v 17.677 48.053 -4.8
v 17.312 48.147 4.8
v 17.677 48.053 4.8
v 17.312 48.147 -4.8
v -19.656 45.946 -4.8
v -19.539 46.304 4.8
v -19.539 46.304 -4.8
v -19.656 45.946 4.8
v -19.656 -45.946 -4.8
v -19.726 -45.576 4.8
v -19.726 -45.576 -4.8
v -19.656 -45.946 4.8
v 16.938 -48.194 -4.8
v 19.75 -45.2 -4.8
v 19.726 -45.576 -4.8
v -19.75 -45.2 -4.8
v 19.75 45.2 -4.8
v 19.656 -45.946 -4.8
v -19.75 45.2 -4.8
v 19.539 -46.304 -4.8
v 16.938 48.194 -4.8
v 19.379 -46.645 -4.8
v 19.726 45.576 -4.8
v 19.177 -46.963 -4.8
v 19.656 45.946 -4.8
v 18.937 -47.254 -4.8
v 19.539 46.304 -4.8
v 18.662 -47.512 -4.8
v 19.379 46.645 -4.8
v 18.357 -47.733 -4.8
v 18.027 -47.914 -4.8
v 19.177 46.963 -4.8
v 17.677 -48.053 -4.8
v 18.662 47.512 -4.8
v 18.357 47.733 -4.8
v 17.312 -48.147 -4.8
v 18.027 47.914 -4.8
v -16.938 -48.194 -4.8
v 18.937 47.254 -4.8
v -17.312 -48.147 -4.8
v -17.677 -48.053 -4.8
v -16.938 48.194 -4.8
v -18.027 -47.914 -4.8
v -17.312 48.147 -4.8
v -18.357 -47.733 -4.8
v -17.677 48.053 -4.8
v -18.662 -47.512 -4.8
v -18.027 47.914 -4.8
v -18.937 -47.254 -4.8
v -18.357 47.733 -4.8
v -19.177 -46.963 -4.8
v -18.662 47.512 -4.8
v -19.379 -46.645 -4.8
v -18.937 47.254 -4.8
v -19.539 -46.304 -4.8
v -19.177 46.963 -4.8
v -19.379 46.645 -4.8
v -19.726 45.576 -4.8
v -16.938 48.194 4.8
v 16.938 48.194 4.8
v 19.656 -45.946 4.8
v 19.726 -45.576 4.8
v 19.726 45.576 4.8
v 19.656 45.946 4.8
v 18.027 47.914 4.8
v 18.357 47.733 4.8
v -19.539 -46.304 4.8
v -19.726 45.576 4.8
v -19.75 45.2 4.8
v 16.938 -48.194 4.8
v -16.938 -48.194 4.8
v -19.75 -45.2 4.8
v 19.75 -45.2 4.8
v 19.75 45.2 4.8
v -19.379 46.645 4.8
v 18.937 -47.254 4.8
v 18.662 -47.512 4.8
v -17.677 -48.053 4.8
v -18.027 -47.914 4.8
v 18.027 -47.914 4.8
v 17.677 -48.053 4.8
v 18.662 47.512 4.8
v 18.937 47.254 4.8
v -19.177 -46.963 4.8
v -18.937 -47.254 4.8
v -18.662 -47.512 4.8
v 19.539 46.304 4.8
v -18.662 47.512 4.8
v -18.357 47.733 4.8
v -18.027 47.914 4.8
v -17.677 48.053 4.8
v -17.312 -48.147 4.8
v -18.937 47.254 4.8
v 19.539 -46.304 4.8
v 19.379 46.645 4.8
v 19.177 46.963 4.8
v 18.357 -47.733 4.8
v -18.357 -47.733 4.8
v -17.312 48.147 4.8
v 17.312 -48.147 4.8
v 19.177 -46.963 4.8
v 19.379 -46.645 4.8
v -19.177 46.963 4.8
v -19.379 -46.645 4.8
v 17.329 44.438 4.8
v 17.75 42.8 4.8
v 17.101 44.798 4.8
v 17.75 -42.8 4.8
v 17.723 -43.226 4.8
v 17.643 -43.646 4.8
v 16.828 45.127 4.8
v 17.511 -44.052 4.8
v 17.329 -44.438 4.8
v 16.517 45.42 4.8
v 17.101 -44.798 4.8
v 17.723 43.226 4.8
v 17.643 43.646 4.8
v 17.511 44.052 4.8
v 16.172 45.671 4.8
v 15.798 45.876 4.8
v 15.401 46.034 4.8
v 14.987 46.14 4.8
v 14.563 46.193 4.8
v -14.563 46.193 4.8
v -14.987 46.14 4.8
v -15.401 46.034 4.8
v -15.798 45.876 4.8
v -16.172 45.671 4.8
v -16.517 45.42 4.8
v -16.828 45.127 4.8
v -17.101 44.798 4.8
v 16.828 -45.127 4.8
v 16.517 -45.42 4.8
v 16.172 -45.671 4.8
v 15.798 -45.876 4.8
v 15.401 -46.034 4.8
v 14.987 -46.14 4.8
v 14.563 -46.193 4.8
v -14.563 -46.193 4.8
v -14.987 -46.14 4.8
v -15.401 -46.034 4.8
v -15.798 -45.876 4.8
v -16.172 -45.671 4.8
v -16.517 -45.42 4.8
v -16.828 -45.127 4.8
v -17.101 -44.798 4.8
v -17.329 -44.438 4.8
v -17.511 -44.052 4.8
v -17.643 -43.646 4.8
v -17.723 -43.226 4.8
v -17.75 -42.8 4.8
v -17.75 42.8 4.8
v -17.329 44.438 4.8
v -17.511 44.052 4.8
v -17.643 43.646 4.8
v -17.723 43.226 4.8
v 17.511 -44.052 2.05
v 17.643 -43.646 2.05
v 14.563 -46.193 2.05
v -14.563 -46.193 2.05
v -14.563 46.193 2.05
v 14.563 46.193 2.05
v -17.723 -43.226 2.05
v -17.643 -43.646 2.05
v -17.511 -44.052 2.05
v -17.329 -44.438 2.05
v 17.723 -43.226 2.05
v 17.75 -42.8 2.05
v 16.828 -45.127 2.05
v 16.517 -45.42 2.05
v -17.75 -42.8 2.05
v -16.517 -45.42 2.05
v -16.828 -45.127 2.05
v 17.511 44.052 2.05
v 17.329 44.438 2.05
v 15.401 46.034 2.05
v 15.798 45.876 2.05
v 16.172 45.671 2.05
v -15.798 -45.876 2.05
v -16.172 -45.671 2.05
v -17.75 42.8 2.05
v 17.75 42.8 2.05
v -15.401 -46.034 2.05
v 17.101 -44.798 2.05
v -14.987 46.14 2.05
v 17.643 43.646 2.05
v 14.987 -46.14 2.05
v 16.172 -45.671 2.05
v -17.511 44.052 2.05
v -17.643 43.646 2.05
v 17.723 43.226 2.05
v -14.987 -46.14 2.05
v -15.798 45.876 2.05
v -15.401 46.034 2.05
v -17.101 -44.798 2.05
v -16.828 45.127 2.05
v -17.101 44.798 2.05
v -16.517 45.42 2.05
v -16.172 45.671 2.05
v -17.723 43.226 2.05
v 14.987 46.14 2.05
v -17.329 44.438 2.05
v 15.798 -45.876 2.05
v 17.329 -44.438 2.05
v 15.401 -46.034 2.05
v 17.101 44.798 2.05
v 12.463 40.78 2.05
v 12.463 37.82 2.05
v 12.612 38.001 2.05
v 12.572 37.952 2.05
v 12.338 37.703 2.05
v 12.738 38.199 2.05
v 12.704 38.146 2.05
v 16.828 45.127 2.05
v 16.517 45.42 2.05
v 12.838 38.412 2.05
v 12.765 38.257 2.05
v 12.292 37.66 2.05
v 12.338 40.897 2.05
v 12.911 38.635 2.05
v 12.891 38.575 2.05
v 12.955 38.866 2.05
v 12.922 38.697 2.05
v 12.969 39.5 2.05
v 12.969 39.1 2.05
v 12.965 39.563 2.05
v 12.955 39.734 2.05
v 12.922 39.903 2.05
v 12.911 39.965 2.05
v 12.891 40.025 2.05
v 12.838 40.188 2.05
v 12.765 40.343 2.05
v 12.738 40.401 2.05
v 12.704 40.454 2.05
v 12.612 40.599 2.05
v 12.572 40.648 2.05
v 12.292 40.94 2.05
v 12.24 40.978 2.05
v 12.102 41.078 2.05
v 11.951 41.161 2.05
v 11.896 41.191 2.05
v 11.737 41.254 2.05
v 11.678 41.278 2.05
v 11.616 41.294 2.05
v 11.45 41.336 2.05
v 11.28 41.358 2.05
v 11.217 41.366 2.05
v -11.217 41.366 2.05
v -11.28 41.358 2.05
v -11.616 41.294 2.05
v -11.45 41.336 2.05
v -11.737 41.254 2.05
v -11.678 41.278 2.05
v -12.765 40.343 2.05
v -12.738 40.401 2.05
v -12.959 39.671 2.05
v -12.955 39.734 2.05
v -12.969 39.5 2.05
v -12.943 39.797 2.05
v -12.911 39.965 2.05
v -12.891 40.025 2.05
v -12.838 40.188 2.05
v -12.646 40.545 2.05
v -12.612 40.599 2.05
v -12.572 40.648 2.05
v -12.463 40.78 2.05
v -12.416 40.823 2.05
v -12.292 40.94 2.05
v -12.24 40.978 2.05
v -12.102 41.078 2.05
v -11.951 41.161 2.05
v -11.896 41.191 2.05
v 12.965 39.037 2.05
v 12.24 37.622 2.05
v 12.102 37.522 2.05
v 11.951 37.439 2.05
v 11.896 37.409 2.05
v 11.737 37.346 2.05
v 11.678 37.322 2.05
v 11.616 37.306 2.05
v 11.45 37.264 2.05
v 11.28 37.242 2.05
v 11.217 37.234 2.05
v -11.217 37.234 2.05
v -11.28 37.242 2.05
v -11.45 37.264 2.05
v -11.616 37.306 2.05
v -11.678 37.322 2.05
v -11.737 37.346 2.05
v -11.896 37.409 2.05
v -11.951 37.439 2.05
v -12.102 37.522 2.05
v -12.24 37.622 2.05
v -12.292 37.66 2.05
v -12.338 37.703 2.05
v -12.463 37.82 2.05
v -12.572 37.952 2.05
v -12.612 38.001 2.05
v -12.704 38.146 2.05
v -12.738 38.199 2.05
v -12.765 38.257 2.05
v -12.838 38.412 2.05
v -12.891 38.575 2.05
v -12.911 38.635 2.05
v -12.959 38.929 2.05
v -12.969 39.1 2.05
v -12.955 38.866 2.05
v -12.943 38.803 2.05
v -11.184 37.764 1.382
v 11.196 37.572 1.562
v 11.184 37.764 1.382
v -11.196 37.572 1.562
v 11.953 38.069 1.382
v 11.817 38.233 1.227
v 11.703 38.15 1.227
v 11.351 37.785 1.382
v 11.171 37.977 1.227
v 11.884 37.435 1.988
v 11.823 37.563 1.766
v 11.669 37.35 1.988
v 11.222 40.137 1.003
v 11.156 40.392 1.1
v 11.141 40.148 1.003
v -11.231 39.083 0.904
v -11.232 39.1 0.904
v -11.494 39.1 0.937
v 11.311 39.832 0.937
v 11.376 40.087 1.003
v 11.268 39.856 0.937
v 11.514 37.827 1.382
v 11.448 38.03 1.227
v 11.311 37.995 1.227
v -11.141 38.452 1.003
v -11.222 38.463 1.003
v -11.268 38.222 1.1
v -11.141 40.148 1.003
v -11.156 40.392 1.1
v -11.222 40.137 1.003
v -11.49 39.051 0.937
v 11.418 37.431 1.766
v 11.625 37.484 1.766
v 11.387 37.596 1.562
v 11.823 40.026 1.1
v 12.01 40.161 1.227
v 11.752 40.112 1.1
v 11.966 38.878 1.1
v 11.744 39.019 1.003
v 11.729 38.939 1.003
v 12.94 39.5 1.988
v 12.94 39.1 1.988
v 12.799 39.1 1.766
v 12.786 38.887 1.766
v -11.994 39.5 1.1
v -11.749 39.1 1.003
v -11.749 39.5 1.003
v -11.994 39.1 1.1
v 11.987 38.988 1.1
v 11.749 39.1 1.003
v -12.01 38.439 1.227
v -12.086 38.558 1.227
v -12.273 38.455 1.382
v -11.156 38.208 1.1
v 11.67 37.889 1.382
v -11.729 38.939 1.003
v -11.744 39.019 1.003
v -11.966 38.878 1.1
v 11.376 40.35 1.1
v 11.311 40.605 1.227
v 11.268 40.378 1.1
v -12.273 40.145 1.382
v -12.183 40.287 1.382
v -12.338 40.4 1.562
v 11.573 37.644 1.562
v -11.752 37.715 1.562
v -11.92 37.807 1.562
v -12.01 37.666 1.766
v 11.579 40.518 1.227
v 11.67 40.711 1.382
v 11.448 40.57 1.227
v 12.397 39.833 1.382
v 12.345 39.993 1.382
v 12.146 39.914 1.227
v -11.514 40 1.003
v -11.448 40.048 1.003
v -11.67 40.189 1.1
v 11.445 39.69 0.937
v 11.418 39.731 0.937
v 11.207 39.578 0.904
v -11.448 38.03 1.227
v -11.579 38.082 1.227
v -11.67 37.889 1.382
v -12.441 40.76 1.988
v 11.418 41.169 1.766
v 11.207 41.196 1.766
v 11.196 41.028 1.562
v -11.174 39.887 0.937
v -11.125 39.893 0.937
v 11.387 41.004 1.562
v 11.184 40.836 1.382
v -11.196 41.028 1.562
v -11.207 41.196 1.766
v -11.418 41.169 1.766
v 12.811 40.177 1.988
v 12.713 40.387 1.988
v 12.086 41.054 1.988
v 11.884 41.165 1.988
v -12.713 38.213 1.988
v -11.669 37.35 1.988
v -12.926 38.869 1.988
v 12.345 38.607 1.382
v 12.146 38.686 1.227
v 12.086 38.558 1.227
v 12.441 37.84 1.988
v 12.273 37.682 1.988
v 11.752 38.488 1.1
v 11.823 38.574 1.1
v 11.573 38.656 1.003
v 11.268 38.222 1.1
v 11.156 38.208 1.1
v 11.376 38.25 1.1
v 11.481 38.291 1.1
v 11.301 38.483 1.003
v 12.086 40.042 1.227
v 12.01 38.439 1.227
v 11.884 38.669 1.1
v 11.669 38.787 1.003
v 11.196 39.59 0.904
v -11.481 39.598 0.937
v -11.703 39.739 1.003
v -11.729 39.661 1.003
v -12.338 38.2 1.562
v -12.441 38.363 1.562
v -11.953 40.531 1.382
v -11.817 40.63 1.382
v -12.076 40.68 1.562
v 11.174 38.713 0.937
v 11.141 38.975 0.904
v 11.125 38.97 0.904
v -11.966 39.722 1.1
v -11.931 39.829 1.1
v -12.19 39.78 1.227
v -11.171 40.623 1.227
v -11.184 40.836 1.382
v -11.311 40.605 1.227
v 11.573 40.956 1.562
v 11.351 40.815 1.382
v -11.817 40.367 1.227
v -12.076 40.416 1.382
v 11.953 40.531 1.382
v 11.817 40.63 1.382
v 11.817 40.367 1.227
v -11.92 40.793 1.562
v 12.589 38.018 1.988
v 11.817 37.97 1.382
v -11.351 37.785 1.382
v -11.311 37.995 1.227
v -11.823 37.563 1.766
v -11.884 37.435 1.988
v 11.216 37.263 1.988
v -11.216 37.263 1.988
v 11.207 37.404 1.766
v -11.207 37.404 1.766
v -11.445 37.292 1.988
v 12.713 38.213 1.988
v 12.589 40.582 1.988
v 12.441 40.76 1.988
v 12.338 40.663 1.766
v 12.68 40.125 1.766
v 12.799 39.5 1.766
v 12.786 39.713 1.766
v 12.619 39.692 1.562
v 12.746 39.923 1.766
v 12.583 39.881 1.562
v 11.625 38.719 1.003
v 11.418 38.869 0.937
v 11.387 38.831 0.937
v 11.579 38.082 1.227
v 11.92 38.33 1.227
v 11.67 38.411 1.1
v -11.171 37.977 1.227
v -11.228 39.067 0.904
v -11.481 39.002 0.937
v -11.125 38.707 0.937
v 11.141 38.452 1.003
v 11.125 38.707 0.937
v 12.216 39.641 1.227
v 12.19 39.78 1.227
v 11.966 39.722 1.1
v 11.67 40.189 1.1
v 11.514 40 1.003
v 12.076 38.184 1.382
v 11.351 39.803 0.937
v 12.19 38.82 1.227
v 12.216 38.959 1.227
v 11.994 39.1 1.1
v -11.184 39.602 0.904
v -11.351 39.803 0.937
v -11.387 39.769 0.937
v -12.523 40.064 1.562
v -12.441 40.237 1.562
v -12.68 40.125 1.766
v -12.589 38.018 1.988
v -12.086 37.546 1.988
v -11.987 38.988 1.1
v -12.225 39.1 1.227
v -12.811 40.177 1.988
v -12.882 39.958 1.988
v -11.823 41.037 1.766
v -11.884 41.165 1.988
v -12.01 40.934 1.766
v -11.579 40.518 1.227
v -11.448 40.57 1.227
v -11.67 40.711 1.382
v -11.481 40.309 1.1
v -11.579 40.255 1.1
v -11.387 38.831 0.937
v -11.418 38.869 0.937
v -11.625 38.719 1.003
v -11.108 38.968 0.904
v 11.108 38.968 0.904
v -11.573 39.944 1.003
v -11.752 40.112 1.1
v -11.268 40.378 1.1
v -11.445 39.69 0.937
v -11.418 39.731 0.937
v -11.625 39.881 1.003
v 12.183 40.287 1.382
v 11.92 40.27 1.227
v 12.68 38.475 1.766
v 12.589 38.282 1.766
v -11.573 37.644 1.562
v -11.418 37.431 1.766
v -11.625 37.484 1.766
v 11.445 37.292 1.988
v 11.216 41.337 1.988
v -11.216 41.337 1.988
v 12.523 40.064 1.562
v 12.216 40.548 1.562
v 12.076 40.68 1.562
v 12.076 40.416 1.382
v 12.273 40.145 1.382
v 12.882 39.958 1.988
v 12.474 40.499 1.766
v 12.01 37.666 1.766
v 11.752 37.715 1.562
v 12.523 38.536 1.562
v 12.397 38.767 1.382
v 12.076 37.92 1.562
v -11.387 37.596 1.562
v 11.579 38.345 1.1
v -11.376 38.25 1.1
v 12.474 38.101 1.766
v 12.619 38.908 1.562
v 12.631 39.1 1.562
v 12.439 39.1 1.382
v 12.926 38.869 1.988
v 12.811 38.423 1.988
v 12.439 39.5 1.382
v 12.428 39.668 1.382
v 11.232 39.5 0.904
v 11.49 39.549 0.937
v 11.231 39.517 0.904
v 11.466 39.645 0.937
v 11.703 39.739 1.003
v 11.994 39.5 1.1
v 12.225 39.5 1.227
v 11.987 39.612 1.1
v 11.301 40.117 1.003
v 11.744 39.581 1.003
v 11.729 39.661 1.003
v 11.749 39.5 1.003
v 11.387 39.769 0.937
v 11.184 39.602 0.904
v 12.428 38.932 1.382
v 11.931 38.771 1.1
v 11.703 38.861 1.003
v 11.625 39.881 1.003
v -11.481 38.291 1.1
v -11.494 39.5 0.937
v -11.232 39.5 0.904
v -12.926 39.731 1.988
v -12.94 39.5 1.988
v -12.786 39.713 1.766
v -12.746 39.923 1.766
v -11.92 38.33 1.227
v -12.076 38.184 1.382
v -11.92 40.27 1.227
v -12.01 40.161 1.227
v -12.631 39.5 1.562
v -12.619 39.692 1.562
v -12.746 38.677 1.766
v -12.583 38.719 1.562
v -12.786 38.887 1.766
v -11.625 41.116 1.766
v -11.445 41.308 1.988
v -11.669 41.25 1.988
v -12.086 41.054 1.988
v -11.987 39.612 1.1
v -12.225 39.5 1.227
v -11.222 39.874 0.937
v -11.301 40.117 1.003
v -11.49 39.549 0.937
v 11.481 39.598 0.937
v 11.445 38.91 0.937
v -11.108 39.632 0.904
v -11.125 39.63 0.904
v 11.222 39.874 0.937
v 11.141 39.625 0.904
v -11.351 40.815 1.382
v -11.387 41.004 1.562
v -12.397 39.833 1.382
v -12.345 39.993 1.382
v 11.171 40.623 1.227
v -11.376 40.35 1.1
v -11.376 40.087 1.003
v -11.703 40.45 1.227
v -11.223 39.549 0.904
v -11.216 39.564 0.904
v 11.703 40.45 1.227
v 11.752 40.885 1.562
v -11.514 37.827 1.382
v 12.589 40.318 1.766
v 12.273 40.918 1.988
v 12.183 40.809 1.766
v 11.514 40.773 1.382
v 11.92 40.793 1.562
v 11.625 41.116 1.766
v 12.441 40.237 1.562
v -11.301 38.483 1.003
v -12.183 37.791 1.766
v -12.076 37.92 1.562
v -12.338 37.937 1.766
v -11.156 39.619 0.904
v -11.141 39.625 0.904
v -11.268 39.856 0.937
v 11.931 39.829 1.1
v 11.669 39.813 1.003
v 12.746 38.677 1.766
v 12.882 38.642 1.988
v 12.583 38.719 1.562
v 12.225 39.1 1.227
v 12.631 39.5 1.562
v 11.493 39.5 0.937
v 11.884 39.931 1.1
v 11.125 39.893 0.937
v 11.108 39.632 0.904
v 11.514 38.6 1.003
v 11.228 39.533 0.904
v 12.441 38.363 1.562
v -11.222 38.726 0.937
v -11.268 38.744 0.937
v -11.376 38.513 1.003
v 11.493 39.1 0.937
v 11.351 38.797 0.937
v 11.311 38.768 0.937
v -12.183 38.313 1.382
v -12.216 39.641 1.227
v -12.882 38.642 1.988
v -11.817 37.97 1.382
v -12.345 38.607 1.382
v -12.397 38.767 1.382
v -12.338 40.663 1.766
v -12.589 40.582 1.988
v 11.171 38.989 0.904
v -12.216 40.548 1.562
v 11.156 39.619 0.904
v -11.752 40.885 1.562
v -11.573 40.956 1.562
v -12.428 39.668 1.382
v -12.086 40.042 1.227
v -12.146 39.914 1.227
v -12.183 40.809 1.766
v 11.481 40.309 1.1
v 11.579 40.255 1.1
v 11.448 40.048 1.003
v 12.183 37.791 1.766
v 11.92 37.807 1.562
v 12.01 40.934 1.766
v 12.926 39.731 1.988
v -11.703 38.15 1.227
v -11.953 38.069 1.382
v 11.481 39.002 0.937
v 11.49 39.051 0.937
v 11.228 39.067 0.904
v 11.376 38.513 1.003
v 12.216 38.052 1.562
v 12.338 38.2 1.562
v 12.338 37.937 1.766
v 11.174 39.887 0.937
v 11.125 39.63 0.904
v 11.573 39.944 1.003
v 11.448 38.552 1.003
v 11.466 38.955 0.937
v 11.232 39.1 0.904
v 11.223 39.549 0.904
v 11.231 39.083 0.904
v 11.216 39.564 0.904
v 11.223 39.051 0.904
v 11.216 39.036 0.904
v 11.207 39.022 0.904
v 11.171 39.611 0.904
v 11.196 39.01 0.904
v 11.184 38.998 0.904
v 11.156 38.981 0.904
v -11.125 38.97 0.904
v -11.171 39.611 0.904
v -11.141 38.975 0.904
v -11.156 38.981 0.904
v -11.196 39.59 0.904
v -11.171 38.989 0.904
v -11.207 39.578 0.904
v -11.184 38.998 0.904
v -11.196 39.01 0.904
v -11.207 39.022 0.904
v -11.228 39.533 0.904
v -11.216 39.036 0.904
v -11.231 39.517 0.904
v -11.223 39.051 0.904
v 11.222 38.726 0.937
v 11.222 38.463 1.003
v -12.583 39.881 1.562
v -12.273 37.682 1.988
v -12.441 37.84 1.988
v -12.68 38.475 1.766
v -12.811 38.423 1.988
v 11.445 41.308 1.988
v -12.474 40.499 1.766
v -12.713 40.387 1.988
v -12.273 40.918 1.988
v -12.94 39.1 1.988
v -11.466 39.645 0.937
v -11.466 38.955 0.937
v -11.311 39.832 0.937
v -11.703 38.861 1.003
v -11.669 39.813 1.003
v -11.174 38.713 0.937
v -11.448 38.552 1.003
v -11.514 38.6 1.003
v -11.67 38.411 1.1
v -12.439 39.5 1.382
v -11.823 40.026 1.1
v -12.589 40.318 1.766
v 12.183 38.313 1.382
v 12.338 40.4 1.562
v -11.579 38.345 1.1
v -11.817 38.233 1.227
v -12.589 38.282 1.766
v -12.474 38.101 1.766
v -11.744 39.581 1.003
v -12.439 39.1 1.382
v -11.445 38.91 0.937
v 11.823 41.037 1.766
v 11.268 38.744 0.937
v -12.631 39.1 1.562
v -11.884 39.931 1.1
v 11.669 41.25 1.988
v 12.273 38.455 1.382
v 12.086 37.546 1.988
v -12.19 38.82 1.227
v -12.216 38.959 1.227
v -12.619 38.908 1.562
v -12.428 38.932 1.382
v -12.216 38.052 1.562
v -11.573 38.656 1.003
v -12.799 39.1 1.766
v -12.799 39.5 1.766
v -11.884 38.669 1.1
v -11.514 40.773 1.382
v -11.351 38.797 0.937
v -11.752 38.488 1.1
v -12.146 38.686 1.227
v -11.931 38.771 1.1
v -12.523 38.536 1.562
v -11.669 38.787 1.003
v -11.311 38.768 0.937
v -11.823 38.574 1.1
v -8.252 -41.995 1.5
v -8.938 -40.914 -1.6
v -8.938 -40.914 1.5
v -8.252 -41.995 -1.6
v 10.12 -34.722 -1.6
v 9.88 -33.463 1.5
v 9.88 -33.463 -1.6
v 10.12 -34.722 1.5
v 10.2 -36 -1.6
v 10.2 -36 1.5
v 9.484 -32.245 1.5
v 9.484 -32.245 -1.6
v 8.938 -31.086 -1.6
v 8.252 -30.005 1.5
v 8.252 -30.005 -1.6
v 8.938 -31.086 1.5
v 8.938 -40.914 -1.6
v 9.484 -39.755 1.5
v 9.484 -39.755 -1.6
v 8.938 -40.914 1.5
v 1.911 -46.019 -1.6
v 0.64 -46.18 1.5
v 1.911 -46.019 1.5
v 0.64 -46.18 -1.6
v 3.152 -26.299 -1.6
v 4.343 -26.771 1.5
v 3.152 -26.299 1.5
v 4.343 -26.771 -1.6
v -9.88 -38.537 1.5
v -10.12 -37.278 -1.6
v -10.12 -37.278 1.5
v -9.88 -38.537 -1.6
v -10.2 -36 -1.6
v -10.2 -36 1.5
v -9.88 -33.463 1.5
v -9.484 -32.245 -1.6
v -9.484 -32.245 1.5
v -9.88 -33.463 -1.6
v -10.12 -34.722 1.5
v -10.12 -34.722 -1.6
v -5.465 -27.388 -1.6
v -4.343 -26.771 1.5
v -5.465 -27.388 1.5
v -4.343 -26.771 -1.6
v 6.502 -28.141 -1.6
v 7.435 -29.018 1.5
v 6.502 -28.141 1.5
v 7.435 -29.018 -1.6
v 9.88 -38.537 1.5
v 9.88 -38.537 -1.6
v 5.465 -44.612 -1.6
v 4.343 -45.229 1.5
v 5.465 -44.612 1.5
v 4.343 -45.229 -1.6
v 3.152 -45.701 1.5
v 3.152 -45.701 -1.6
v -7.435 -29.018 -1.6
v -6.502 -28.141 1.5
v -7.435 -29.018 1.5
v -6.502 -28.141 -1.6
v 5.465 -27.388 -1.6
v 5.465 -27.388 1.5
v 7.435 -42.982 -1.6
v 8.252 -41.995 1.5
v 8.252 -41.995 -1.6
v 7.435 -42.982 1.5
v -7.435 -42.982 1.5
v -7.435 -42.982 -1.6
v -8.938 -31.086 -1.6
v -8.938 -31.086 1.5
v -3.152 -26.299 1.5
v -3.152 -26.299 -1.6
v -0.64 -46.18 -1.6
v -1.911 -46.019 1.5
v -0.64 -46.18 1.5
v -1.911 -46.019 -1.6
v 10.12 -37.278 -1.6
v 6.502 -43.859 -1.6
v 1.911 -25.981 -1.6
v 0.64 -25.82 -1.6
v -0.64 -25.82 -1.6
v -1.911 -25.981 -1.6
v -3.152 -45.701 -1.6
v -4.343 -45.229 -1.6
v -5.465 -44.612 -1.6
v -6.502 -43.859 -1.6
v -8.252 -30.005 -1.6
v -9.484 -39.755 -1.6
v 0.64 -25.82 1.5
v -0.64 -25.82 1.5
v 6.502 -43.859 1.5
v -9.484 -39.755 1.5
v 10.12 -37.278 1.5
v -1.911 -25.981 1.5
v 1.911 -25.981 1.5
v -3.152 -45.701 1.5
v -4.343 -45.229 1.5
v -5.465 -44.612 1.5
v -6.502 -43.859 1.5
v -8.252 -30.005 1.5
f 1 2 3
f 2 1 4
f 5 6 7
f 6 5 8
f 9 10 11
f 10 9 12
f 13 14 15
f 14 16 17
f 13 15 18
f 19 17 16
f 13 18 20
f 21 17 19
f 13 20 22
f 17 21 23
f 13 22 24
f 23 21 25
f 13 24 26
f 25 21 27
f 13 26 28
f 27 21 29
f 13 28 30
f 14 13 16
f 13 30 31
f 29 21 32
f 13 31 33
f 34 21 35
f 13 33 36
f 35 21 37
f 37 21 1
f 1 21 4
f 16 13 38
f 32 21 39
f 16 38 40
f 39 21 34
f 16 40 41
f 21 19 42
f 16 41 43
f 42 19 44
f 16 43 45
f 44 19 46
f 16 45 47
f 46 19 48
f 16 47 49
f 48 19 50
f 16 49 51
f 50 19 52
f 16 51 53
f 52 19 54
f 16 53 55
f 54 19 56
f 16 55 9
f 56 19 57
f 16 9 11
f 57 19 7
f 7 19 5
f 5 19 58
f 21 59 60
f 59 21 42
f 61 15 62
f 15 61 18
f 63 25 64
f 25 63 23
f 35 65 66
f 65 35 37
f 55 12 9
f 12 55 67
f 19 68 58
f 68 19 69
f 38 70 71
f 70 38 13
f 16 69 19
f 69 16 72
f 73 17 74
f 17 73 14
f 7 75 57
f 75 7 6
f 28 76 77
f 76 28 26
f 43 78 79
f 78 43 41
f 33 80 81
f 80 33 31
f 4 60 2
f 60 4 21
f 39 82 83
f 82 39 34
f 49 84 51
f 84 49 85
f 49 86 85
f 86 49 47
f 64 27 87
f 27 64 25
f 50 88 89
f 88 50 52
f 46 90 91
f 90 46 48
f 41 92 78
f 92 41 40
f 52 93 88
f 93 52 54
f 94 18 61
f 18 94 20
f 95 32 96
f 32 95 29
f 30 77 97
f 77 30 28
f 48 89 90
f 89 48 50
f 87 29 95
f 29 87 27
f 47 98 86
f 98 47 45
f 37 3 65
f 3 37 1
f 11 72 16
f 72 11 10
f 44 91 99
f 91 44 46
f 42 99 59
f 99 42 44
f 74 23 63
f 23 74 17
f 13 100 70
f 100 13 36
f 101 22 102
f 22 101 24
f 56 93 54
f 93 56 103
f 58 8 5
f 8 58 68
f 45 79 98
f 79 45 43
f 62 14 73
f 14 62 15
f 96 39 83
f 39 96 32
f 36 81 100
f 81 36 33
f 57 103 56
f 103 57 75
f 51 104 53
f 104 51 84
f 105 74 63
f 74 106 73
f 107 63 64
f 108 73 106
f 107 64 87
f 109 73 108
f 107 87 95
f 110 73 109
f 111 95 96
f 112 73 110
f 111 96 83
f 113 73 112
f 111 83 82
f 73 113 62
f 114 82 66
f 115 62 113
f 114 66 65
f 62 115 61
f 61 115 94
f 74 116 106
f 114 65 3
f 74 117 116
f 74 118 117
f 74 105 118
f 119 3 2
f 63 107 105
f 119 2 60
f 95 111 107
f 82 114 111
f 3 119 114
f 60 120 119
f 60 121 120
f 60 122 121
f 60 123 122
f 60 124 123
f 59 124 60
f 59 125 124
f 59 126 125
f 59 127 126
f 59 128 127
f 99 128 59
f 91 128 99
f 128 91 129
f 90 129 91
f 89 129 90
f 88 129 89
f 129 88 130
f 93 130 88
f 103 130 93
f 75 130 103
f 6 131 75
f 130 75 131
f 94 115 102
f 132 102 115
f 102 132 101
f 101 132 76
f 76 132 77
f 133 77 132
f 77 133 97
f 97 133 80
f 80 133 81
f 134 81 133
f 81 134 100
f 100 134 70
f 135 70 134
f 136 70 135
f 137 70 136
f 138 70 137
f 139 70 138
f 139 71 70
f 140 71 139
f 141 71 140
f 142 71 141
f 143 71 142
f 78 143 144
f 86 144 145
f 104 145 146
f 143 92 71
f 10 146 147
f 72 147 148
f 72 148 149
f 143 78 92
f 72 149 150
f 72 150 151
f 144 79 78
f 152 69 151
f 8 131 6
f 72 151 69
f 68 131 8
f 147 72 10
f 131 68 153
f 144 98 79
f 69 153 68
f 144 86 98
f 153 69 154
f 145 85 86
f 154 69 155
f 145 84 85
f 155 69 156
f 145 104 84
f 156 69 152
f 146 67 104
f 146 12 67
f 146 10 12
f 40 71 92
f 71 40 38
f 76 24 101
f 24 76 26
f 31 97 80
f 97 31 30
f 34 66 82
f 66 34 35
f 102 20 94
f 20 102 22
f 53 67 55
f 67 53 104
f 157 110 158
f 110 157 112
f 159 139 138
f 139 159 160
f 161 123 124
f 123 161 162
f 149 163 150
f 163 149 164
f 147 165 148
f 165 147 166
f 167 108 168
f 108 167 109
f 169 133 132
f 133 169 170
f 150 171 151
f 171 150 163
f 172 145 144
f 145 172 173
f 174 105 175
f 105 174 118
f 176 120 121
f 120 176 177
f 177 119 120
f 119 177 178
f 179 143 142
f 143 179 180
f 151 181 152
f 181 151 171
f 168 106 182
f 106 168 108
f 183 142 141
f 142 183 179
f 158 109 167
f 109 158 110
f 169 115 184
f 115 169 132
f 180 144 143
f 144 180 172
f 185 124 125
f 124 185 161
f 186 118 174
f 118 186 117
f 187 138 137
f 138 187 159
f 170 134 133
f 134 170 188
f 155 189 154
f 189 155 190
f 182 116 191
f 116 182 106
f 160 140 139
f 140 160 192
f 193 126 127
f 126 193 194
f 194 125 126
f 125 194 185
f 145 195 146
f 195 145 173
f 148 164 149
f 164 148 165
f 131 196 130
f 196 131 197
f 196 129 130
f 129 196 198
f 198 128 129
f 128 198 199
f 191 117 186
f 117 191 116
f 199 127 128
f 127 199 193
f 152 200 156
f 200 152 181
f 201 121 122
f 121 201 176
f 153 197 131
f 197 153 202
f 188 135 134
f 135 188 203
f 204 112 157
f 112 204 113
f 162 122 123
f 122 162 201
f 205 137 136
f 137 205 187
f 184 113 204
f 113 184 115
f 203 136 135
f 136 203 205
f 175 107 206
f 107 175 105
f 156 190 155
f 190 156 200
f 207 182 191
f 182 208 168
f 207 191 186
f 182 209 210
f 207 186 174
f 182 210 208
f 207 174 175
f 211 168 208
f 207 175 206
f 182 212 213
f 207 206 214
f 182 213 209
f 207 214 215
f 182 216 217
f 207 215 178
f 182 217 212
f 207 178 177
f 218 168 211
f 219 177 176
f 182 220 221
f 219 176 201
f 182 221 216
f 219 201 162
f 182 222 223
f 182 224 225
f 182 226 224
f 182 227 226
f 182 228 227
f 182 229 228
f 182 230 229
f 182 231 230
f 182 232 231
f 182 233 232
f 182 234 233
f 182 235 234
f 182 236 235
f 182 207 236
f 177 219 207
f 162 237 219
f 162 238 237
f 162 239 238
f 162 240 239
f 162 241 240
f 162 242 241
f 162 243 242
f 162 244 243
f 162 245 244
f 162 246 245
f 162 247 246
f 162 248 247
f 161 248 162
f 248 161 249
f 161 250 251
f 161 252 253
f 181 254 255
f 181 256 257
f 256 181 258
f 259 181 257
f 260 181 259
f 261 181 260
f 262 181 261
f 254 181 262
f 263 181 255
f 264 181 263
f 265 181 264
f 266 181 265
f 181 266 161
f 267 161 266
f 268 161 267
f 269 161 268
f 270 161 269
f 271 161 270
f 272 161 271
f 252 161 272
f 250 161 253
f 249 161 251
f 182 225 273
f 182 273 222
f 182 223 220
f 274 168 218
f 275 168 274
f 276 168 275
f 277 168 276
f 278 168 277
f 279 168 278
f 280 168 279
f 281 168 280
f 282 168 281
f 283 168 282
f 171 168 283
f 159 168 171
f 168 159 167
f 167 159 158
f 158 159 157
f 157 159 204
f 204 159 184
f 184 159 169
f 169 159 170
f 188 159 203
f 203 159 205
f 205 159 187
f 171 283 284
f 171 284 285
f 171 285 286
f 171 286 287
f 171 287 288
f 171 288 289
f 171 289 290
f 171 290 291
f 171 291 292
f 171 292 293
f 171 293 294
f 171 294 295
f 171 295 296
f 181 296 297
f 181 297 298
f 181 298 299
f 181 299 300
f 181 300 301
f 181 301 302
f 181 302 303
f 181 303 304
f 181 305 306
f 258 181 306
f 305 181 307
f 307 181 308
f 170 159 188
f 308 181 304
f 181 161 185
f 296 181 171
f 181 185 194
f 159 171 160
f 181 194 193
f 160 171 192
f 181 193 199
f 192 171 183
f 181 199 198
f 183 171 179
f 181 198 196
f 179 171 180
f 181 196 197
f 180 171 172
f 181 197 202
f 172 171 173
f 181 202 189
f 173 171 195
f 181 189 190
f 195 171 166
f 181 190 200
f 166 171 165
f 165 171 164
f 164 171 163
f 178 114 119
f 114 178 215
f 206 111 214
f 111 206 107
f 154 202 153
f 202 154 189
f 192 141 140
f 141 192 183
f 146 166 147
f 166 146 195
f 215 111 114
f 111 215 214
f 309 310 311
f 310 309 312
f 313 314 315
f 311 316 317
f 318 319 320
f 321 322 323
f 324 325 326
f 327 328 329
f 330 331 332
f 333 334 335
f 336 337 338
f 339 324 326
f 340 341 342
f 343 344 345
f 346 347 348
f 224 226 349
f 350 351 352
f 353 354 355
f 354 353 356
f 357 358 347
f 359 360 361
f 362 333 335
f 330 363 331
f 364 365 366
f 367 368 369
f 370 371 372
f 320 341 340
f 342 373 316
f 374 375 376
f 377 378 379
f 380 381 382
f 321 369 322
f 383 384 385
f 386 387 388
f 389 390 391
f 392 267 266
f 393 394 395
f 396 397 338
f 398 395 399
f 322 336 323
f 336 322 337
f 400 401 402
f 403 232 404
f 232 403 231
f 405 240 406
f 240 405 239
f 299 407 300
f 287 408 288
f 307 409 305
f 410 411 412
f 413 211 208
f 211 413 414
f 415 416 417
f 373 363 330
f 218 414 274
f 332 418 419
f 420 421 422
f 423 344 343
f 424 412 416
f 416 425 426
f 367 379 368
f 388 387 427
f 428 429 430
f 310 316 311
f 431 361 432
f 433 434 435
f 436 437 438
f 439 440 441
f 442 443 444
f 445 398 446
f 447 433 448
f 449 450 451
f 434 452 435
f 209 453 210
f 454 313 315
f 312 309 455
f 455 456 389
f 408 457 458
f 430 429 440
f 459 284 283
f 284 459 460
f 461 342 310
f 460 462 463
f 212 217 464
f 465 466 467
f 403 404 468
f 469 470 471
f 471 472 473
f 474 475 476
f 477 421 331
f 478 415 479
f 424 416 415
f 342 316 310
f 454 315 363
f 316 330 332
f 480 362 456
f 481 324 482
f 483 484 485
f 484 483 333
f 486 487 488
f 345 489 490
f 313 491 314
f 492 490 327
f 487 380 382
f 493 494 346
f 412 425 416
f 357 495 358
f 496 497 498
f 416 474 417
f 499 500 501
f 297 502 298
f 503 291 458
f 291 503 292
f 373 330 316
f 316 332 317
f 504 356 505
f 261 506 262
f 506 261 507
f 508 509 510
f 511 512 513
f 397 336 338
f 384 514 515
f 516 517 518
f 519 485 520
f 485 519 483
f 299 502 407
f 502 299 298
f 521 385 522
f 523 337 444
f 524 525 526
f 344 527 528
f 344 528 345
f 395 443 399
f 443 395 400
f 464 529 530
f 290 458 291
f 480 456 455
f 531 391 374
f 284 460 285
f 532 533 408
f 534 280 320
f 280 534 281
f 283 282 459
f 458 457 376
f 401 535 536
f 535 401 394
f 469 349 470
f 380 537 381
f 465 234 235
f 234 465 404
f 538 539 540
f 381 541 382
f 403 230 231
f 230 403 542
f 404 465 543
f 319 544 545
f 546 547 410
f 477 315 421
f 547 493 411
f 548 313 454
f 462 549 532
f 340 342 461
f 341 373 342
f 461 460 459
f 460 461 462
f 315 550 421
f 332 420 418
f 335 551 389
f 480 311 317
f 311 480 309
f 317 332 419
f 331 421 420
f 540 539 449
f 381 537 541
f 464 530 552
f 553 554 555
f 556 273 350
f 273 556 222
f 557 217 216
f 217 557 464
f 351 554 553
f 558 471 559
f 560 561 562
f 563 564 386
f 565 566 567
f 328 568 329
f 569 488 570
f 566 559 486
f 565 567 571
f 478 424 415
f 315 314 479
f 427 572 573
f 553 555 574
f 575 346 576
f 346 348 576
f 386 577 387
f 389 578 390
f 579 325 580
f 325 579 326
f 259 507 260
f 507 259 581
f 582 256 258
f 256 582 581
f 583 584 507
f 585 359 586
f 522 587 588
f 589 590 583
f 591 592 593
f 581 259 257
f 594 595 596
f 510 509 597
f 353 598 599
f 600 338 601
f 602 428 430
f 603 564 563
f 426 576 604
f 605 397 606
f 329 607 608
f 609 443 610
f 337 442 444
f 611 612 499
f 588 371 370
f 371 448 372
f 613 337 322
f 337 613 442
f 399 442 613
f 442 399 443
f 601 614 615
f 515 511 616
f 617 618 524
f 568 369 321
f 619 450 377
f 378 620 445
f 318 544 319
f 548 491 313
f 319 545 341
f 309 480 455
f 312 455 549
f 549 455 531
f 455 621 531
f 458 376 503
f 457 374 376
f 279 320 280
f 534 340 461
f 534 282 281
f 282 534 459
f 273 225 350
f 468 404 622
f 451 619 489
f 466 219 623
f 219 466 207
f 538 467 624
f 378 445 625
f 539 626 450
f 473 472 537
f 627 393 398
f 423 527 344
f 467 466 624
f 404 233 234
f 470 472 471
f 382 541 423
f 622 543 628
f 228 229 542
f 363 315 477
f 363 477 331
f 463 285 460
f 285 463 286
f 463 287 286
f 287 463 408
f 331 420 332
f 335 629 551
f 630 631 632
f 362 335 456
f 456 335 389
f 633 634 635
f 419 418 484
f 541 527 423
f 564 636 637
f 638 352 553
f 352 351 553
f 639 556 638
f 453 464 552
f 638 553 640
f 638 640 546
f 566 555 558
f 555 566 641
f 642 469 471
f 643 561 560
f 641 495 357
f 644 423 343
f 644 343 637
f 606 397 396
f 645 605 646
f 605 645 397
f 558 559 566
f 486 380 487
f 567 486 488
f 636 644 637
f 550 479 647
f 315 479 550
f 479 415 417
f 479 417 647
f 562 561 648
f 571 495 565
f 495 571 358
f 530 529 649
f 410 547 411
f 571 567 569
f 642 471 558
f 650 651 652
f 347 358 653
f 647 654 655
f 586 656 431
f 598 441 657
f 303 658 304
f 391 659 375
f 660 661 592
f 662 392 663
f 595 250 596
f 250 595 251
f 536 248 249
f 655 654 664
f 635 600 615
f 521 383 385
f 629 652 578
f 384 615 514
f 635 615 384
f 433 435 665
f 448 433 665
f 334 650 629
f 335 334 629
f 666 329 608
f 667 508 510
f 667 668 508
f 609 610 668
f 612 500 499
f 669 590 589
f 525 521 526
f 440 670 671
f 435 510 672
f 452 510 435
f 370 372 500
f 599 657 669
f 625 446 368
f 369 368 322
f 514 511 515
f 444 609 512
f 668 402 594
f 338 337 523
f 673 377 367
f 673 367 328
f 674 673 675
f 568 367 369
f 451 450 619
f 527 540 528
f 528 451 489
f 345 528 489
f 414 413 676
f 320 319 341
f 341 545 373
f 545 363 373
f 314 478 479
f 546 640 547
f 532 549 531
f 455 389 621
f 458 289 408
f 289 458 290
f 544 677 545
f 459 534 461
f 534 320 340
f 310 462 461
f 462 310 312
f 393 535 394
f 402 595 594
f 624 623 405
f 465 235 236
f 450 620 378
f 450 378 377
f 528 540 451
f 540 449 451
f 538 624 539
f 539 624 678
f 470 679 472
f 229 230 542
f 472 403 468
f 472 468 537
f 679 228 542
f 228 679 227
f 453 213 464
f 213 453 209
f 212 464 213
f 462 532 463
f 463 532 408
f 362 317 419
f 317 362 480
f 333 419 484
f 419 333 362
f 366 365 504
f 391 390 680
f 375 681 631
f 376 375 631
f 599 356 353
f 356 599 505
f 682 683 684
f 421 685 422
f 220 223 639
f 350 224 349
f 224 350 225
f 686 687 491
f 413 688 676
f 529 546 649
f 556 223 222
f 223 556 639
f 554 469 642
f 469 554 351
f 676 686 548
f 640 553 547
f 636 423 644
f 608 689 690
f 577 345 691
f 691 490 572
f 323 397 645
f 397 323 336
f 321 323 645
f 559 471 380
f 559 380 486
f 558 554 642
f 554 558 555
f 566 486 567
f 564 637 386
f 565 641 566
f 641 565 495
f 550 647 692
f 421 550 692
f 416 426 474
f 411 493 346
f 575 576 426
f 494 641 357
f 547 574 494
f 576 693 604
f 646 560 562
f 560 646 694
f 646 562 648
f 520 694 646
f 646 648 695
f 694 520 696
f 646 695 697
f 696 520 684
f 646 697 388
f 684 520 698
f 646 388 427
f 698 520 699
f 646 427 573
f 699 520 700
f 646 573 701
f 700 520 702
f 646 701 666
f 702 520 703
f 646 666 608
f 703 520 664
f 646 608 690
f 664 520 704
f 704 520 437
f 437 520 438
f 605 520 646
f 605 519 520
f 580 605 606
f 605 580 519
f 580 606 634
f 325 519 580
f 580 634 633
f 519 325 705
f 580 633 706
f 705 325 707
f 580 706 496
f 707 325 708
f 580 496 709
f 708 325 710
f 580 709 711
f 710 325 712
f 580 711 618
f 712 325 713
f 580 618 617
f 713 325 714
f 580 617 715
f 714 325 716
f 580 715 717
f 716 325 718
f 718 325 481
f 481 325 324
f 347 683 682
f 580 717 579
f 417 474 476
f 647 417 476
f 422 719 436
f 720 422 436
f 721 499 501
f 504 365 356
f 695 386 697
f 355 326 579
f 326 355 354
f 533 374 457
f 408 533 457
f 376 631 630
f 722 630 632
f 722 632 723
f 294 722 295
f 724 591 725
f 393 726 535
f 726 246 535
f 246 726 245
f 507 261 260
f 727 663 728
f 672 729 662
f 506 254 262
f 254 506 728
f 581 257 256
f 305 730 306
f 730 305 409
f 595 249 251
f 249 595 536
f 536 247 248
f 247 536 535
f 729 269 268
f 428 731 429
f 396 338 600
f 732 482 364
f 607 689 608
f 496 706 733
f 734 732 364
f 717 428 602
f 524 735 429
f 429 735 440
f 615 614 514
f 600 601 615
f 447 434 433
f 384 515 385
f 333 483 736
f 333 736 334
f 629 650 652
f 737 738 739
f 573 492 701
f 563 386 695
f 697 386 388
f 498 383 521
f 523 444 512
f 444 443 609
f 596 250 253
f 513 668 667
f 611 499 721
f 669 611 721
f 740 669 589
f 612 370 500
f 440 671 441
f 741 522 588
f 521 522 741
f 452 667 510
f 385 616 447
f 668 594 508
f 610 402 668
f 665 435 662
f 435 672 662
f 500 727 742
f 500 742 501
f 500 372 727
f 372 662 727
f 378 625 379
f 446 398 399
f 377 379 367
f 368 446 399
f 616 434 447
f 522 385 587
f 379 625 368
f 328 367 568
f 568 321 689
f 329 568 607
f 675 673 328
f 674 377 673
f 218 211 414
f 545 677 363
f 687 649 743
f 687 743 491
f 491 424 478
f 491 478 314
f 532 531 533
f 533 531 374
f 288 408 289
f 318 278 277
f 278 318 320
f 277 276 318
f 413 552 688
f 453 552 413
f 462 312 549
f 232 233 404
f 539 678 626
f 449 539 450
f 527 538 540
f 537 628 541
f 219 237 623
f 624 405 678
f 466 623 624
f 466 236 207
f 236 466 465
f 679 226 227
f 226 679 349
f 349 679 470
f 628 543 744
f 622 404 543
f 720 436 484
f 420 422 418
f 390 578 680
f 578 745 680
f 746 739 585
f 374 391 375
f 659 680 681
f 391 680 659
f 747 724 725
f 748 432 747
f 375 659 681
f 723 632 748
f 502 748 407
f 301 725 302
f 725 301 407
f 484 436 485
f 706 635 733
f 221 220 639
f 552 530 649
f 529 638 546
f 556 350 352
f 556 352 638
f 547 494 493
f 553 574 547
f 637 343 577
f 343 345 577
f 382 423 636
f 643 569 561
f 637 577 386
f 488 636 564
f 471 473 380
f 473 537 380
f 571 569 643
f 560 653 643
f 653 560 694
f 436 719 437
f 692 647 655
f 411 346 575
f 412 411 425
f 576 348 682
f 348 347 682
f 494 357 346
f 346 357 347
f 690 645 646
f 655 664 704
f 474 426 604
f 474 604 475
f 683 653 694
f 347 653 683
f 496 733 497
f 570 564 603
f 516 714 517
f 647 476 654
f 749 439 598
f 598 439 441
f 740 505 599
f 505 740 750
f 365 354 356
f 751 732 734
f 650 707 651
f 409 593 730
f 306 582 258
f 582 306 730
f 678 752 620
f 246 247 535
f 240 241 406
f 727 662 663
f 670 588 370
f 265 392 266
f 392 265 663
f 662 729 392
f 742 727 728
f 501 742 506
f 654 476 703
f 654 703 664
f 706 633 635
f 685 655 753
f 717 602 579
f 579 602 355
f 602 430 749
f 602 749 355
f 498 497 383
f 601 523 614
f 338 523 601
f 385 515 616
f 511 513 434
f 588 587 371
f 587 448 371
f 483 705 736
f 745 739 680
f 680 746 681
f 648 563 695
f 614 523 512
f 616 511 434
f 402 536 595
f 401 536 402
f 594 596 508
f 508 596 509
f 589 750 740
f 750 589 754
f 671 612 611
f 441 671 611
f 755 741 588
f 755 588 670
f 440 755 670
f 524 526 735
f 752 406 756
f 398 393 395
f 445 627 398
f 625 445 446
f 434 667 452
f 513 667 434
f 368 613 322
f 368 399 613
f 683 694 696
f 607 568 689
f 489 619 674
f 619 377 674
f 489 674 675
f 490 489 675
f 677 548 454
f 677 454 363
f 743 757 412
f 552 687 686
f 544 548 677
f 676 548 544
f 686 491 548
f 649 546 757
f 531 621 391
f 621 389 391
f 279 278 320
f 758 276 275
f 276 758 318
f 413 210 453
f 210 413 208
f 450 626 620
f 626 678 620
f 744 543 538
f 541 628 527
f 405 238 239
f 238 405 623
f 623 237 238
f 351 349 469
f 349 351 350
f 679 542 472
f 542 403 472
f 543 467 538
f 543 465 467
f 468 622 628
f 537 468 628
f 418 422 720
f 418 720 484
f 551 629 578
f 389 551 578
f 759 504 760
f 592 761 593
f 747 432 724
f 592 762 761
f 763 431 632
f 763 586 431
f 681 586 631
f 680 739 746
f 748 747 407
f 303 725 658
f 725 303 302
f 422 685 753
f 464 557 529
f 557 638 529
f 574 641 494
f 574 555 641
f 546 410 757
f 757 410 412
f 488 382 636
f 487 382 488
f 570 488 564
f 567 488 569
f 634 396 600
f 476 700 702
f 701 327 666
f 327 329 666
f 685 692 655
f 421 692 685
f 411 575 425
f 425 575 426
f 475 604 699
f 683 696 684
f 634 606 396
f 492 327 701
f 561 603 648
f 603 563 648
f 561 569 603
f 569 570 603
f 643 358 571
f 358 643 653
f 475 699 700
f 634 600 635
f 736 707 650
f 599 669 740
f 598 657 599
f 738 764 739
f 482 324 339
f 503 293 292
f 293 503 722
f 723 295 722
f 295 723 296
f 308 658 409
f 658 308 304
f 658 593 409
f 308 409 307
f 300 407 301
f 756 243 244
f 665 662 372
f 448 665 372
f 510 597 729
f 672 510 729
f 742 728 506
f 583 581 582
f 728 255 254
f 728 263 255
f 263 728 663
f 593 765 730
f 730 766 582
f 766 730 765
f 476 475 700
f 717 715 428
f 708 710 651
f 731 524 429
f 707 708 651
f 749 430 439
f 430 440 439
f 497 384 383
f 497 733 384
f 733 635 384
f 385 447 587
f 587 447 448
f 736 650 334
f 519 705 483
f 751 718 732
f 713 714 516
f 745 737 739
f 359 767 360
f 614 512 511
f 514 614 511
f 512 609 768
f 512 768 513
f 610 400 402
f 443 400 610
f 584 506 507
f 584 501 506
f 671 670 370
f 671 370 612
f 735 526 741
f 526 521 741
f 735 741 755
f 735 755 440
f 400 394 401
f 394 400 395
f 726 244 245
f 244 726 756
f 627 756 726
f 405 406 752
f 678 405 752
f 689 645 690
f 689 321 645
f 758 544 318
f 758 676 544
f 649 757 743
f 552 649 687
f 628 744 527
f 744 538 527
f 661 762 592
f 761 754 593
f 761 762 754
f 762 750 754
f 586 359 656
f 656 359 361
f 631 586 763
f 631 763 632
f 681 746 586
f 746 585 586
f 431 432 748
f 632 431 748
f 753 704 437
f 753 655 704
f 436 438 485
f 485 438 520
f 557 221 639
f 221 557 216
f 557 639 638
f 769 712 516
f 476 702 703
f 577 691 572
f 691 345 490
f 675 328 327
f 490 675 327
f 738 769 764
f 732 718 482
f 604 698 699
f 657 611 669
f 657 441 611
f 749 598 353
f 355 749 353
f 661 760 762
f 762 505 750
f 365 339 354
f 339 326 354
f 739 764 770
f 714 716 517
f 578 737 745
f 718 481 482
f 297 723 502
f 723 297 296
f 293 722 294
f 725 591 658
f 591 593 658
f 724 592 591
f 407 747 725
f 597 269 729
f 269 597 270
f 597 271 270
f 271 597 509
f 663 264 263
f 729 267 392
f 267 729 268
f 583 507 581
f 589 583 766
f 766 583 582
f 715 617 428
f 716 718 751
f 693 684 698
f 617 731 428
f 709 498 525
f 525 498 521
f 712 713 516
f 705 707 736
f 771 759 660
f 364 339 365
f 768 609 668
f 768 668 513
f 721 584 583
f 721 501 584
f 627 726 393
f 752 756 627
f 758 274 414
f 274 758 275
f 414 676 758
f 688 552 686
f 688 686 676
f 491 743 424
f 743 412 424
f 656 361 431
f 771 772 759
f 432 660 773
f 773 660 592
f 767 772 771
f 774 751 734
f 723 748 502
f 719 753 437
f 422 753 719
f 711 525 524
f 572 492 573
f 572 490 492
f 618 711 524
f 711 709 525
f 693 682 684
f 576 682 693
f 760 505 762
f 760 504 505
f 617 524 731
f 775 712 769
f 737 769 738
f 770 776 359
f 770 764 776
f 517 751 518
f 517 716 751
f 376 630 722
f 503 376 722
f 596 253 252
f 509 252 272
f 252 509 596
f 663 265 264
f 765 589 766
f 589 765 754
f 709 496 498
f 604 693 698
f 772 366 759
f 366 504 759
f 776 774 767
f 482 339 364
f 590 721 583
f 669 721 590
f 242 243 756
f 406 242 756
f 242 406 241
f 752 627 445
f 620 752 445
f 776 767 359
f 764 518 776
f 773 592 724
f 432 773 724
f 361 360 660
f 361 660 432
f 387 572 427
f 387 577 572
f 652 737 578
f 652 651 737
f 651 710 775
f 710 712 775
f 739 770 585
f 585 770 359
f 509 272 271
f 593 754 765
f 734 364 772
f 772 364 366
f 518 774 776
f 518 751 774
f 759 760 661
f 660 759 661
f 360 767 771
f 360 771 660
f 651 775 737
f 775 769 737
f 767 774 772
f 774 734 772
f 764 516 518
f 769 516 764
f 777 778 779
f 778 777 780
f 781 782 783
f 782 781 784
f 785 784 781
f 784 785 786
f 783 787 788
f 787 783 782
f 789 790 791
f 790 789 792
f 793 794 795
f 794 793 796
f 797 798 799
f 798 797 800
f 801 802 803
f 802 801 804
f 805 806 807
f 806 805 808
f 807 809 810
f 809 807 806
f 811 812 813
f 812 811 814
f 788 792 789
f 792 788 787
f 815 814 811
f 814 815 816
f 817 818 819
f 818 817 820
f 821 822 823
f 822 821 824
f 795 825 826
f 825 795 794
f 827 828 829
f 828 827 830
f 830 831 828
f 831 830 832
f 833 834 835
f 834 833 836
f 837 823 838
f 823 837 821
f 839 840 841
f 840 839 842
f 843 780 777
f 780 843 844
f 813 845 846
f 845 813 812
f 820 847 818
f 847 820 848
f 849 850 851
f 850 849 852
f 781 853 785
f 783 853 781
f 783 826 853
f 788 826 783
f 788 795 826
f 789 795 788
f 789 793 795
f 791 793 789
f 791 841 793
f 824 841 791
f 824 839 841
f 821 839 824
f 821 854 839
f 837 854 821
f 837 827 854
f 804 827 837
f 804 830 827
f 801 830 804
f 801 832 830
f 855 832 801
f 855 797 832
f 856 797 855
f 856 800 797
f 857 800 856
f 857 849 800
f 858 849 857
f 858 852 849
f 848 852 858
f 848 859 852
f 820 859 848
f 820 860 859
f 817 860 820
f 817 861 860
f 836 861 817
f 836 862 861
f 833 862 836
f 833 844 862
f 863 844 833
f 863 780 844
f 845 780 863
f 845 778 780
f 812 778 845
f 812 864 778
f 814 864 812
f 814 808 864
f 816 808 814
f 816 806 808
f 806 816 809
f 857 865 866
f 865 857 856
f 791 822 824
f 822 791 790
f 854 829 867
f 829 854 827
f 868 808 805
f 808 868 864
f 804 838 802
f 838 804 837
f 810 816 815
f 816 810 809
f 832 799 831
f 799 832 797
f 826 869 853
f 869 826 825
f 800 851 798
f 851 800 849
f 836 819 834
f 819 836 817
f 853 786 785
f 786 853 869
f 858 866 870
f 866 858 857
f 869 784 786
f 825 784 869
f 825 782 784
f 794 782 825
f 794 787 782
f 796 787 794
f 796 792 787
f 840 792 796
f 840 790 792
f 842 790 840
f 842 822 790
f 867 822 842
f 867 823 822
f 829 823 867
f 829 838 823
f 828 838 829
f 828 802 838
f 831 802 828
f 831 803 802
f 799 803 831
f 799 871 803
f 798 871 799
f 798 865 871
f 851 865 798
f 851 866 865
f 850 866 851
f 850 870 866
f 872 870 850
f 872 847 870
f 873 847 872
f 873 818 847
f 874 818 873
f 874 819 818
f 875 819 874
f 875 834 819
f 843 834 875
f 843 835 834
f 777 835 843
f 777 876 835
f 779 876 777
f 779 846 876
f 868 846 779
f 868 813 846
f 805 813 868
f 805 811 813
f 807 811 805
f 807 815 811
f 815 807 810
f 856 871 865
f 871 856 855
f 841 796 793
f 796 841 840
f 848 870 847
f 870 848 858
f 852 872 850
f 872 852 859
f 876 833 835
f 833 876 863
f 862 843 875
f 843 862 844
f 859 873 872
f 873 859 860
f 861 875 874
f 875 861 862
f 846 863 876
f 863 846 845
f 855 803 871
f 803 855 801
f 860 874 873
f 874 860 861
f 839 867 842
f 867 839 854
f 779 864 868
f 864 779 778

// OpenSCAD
/***************************************************
 *                                                 *
 *          Carrier for Philips Hue Remote         *
 *                                                 *
 * Designed by: https://www.thingiverse.com/smorgo *
 *                                                 *
 * Probably not much use on its own, but if you    *
 * want to fix a Philips Hue Dimmer Remote to      *
 * something, this may be just the thing you need. *
 *                                                 *
 ***************************************************/
 
// You may want to take the quality down whilst fettling:
$fn=50; // 15 might be better until you're ready to print

// There's a 20mm x 3mm magnet embedded in the carrier for the Hue remote (at the bottom).
// I used a filament change command (M600) to pause the printer so that I could pop the magnet in.

// Alternatively, you can change embed_magnet and glue yours in from behind

embed_magnet = true; /* set to false if you're going to glue it in from behind */
magnet_diameter = 20.4;
magnet_depth = 3.1;
magnetY=-36; // My magnet sits at the bottom, because I'm knocking out a hole in the middle. You can set to 0 if you're not doing that

// The dimensions of the Hue remote
hue_height = 92;
hue_width = 35.1;
hue_depth = 11;
hue_corner_radius = 3;
hue_notch_length = 26;
hue_notch_width = 4.2;
hue_notch_depth = 1.8;
hue_notch_inset = 6.7;

// Dimensions for the supporting frame
hue_locator_height = 1.6;
hue_locator_width = 2;
hue_clearance = 0.4;
hue_base_depth = 8;
hue_base_corner_radius = 1;

// Dimensions for Hue carrier
ow = hue_width + hue_clearance + hue_locator_width *2;
oh = hue_height + hue_clearance + hue_locator_width *2;
od = hue_base_depth + hue_locator_height;
hw = hue_width + hue_clearance;
hh = hue_height + hue_clearance;
hd = hue_locator_height + 0.1;
nw = hue_notch_length + hue_clearance;
nh = hue_notch_width + hue_clearance;
nd = hue_notch_depth*2 + hue_clearance;

// Where to put the magnet, vertically
magnetZ=-1.6;

// The roundedcube function, shamelessy lifted from:
// https://danielupshaw.com/openscad-rounded-corners/
module roundedcube(size = [1, 1, 1], center = false, radius = 0.5, apply_to = "all") {
	// If single value, convert to [x, y, z] vector
	size = (size[0] == undef) ? [size, size, size] : size;

	translate_min = radius;
	translate_xmax = size[0] - radius;
	translate_ymax = size[1] - radius;
	translate_zmax = size[2] - radius;

	diameter = radius * 2;

	module build_point(type = "sphere", rotate = [0, 0, 0]) {
		if (type == "sphere") {
			sphere(r = radius);
		} else if (type == "cylinder") {
			rotate(a = rotate)
			cylinder(h = diameter, r = radius, center = true);
		}
	}

	obj_translate = (center == false) ?
		[0, 0, 0] : [
			-(size[0] / 2),
			-(size[1] / 2),
			-(size[2] / 2)
		];

	translate(v = obj_translate) {
		hull() {
			for (translate_x = [translate_min, translate_xmax]) {
				x_at = (translate_x == translate_min) ? "min" : "max";
				for (translate_y = [translate_min, translate_ymax]) {
					y_at = (translate_y == translate_min) ? "min" : "max";
					for (translate_z = [translate_min, translate_zmax]) {
						z_at = (translate_z == translate_min) ? "min" : "max";

						translate(v = [translate_x, translate_y, translate_z])
						if (
							(apply_to == "all") ||
							(apply_to == "xmin" && x_at == "min") || (apply_to == "xmax" && x_at == "max") ||
							(apply_to == "ymin" && y_at == "min") || (apply_to == "ymax" && y_at == "max") ||
							(apply_to == "zmin" && z_at == "min") || (apply_to == "zmax" && z_at == "max")
						) {
							build_point("sphere");
						} else {
							rotate = 
								(apply_to == "xmin" || apply_to == "xmax" || apply_to == "x") ? [0, 90, 0] : (
								(apply_to == "ymin" || apply_to == "ymax" || apply_to == "y") ? [90, 90, 0] :
								[0, 0, 0]
							);
							build_point("cylinder", rotate);
						}
					}
				}
			}
		}
	}
}

module hueCarrier() {

    { 
        {
            difference() {
                roundedcube([ow, oh, od], center = true, radius = hue_corner_radius, apply_to="z");
                translate([0,0,hue_base_depth]) {
                    roundedcube([hw,hh,hd], center=true, radius=hue_corner_radius+hue_clearance, apply_to="z");
                }
                translate([0,hue_height / 2 - hue_notch_inset,(hue_base_depth-hue_notch_depth)/2]) {
                    roundedcube([nw,nh,nd], center=true, radius = hue_notch_width/2);
                }
                magnet();
            }
        }
    }
}

// Knockout a hole for the magnet
module magnet() {
    if(embed_magnet) {
        translate([0, magnetY, magnetZ]) {
            cylinder(d = magnet_diameter, h=magnet_depth);
        }
    } else {
        translate([0, magnetY, magnetZ-50]) {
            cylinder(d = magnet_diameter, h=magnet_depth+50);
        }
    }
}

// Handy if you want to see where the Hue sits
module hue() {
    color("white",0.5) {
        roundedcube([hue_width, hue_height, hue_depth], center=true, radius=hue_corner_radius, apply_to="z");
    }
}

hueCarrier();
